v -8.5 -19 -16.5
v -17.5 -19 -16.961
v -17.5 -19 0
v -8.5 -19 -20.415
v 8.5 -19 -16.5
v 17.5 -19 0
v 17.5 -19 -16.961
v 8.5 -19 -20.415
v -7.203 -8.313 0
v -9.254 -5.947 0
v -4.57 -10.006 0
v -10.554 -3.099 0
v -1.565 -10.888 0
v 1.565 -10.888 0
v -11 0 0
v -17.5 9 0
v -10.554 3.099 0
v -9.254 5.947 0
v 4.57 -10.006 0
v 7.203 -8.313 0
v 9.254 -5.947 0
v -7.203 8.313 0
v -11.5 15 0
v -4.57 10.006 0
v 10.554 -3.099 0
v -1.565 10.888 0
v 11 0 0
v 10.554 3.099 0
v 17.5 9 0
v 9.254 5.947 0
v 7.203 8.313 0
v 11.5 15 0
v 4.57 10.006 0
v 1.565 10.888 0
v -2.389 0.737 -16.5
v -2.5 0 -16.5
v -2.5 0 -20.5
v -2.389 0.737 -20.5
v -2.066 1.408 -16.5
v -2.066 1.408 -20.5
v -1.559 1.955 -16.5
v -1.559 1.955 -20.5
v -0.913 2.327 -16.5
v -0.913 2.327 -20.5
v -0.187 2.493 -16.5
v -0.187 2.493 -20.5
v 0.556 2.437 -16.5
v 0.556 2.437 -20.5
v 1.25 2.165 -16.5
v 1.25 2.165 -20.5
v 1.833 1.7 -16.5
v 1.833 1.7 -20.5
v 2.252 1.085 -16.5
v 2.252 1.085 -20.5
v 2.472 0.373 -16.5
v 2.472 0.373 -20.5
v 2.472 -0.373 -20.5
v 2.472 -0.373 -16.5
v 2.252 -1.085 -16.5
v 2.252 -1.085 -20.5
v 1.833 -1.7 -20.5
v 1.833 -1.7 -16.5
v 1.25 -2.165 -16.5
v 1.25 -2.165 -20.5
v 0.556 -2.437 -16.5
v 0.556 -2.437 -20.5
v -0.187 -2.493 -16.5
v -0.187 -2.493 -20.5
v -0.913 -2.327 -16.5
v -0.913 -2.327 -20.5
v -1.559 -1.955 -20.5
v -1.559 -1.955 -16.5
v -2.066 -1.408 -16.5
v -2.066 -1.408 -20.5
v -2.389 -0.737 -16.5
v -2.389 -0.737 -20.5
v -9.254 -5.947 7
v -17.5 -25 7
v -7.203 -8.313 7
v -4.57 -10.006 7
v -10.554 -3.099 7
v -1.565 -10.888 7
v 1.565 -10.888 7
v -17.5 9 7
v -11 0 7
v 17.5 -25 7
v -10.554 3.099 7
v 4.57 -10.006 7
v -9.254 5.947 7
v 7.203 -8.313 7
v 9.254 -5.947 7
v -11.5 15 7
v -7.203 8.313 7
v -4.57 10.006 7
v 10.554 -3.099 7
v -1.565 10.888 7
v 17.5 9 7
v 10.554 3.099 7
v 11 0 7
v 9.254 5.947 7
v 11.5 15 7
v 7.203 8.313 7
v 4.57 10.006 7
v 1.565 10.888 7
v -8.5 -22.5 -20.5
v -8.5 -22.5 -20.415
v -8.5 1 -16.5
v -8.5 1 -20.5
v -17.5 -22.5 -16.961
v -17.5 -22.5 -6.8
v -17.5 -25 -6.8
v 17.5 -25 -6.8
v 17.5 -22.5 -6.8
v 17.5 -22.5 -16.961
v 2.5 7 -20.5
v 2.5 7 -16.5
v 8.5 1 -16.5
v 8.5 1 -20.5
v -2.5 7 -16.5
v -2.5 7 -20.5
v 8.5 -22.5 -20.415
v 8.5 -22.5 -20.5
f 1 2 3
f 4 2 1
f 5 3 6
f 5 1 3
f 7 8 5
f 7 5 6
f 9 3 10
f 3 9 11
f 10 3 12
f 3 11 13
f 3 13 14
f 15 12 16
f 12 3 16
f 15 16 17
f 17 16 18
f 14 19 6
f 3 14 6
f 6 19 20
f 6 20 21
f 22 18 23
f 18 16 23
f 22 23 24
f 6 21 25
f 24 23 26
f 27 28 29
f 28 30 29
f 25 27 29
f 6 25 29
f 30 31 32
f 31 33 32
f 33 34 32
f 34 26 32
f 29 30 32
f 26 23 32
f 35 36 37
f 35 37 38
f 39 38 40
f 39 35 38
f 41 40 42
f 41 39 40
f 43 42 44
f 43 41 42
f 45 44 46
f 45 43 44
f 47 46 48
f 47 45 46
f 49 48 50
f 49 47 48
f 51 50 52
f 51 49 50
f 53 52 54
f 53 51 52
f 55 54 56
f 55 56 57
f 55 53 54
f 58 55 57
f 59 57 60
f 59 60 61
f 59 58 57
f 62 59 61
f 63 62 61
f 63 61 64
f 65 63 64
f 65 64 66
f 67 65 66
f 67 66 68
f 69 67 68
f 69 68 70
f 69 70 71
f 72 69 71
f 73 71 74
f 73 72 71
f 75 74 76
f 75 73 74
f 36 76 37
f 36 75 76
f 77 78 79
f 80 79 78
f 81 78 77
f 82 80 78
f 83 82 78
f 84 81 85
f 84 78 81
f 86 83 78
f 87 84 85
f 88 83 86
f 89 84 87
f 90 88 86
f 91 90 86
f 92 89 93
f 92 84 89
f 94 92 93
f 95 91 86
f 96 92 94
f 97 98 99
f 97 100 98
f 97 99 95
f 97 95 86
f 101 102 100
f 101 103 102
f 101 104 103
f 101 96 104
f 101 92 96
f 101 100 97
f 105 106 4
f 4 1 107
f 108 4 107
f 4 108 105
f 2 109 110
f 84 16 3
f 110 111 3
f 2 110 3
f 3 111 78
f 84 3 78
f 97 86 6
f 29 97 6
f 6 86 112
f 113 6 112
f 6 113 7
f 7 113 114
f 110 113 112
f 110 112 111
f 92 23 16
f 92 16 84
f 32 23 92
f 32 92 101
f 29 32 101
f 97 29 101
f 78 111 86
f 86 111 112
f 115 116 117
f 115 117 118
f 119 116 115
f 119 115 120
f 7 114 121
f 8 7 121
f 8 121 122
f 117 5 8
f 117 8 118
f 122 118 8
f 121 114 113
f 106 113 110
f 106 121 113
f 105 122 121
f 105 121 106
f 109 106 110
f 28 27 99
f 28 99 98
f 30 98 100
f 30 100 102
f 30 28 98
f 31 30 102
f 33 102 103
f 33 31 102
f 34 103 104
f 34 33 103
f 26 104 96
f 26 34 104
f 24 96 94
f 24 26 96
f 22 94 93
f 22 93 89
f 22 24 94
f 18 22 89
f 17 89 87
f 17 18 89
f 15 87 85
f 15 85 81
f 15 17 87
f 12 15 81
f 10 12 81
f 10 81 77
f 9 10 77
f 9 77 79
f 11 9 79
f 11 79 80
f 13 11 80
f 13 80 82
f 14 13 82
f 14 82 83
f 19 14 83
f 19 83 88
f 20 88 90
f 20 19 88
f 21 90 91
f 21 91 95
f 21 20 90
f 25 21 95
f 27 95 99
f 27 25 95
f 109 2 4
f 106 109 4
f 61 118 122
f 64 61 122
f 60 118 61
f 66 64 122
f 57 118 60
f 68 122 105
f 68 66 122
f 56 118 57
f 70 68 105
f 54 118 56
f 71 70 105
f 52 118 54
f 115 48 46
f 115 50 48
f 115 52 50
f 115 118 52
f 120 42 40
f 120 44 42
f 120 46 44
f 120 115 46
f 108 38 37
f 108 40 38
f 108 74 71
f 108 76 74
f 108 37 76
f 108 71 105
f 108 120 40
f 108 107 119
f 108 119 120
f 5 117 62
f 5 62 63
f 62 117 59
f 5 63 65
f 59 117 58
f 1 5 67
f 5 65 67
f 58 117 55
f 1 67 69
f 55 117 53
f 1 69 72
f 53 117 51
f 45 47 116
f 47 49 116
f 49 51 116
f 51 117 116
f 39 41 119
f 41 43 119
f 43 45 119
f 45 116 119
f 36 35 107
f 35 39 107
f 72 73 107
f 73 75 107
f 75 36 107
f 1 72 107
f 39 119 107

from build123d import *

# Parameters (mm, degrees)
SKETCH1_W           = 35
SKETCH1_H           = 40
SKETCH1_R           = 11
BOSS_EXTRUDE1_DEPTH = 7
SKETCH2_W           = 35
SKETCH2_H           = 6
BOSS_EXTRUDE2_DEPTH = 16.5
SKETCH3_W           = 17
SKETCH3_H           = 32
SKETCH3_R           = 2.5
BOSS_EXTRUDE3_DEPTH = 4
CHAMFER1_SIZE       = 10.2
CHAMFER1_SIZE_2     = 3.915413157
CHAMFER2_SIZE       = 6
SKETCH4_W           = 35
SKETCH4_H           = 2.5
CUT_EXTRUDE1_DEPTH  = 13.7


with BuildPart() as part:
    # Sketch1 → Boss-Extrude1 (new body)
    with BuildSketch(Plane.XY):
        with Locations((0, -5)):
            Rectangle(SKETCH1_W, SKETCH1_H)
        Circle(SKETCH1_R, mode=Mode.SUBTRACT)
    extrude(amount=BOSS_EXTRUDE1_DEPTH)

    # Sketch2 → Boss-Extrude2 (add)
    with BuildSketch(Plane(origin=(0, 0, 0), x_dir=(-1, 0, 0), z_dir=(0, 0, -1))):
        with Locations((0, -22)):
            Rectangle(SKETCH2_W, SKETCH2_H)
    extrude(amount=BOSS_EXTRUDE2_DEPTH)

    # Sketch3 → Boss-Extrude3 (add)
    with BuildSketch(Plane(origin=(0, 0, -16.5), x_dir=(-1, 0, 0), z_dir=(0, 0, -1))):
        with Locations((0, -9)):
            Rectangle(SKETCH3_W, SKETCH3_H)
        Circle(SKETCH3_R, mode=Mode.SUBTRACT)
    extrude(amount=BOSS_EXTRUDE3_DEPTH)

    # Chamfer1
    # the kernel refuses this chamfer: 10.2, 3.915413157 mm, written as the material it adds along each edge
    with BuildSketch(Plane(origin=(-8.5, -19, -16.5), x_dir=(-0.9999045356599434, 0, 0.013817364679016049), z_dir=(0, -1, 0))) as chamfer1_piece_1_section:
        Polygon((CHAMFER1_SIZE * 0.99990453566, CHAMFER1_SIZE * 0.013817364679), (-CHAMFER1_SIZE_2 * 0.0138173646803, CHAMFER1_SIZE_2 * 0.999904535752), (0, 0), align=None)
    chamfer1_piece_1 = extrude(amount=6, mode=Mode.PRIVATE)
    chamfer1_piece_1 = split(chamfer1_piece_1, bisect_by=Plane(origin=(-17.5, -22, -17.821300415), z_dir=(1, 0, 0)), keep=Keep.TOP, mode=Mode.PRIVATE)
    add(chamfer1_piece_1)
    with BuildSketch(Plane(origin=(8.5, -25, -16.5), x_dir=(0.9999045356599434, 0, 0.013817364679016049), z_dir=(0, 1, 0))) as chamfer1_piece_2_section:
        Polygon((CHAMFER1_SIZE * 0.99990453566, CHAMFER1_SIZE * 0.013817364679), (-CHAMFER1_SIZE_2 * 0.0138173646803, CHAMFER1_SIZE_2 * 0.999904535752), (0, 0), align=None)
    chamfer1_piece_2 = extrude(amount=6, mode=Mode.PRIVATE)
    chamfer1_piece_2 = split(chamfer1_piece_2, bisect_by=Plane(origin=(17.5, -22, -17.821300415), z_dir=(-1, 0, 0)), keep=Keep.TOP, mode=Mode.PRIVATE)
    add(chamfer1_piece_2)

    # Chamfer2
    chamfer2_edges = [part.edges().sort_by_distance(p)[0] for p in [
        (-8.5, 7, -18.5),
        (8.5, 7, -18.5),
        (17.5, 15, 3.5),
        (-17.5, 15, 3.5),
    ]]
    chamfer(chamfer2_edges, length=CHAMFER2_SIZE)

    # Sketch4 → Cut-Extrude1 (cut)
    with BuildSketch(Plane(origin=(0, 0, -20.5), x_dir=(-1, 0, 0), z_dir=(0, 0, -1))):
        with Locations((0, -23.75)):
            Rectangle(SKETCH4_W, SKETCH4_H)
    extrude(amount=-CUT_EXTRUDE1_DEPTH, mode=Mode.SUBTRACT)


solid = part.part
